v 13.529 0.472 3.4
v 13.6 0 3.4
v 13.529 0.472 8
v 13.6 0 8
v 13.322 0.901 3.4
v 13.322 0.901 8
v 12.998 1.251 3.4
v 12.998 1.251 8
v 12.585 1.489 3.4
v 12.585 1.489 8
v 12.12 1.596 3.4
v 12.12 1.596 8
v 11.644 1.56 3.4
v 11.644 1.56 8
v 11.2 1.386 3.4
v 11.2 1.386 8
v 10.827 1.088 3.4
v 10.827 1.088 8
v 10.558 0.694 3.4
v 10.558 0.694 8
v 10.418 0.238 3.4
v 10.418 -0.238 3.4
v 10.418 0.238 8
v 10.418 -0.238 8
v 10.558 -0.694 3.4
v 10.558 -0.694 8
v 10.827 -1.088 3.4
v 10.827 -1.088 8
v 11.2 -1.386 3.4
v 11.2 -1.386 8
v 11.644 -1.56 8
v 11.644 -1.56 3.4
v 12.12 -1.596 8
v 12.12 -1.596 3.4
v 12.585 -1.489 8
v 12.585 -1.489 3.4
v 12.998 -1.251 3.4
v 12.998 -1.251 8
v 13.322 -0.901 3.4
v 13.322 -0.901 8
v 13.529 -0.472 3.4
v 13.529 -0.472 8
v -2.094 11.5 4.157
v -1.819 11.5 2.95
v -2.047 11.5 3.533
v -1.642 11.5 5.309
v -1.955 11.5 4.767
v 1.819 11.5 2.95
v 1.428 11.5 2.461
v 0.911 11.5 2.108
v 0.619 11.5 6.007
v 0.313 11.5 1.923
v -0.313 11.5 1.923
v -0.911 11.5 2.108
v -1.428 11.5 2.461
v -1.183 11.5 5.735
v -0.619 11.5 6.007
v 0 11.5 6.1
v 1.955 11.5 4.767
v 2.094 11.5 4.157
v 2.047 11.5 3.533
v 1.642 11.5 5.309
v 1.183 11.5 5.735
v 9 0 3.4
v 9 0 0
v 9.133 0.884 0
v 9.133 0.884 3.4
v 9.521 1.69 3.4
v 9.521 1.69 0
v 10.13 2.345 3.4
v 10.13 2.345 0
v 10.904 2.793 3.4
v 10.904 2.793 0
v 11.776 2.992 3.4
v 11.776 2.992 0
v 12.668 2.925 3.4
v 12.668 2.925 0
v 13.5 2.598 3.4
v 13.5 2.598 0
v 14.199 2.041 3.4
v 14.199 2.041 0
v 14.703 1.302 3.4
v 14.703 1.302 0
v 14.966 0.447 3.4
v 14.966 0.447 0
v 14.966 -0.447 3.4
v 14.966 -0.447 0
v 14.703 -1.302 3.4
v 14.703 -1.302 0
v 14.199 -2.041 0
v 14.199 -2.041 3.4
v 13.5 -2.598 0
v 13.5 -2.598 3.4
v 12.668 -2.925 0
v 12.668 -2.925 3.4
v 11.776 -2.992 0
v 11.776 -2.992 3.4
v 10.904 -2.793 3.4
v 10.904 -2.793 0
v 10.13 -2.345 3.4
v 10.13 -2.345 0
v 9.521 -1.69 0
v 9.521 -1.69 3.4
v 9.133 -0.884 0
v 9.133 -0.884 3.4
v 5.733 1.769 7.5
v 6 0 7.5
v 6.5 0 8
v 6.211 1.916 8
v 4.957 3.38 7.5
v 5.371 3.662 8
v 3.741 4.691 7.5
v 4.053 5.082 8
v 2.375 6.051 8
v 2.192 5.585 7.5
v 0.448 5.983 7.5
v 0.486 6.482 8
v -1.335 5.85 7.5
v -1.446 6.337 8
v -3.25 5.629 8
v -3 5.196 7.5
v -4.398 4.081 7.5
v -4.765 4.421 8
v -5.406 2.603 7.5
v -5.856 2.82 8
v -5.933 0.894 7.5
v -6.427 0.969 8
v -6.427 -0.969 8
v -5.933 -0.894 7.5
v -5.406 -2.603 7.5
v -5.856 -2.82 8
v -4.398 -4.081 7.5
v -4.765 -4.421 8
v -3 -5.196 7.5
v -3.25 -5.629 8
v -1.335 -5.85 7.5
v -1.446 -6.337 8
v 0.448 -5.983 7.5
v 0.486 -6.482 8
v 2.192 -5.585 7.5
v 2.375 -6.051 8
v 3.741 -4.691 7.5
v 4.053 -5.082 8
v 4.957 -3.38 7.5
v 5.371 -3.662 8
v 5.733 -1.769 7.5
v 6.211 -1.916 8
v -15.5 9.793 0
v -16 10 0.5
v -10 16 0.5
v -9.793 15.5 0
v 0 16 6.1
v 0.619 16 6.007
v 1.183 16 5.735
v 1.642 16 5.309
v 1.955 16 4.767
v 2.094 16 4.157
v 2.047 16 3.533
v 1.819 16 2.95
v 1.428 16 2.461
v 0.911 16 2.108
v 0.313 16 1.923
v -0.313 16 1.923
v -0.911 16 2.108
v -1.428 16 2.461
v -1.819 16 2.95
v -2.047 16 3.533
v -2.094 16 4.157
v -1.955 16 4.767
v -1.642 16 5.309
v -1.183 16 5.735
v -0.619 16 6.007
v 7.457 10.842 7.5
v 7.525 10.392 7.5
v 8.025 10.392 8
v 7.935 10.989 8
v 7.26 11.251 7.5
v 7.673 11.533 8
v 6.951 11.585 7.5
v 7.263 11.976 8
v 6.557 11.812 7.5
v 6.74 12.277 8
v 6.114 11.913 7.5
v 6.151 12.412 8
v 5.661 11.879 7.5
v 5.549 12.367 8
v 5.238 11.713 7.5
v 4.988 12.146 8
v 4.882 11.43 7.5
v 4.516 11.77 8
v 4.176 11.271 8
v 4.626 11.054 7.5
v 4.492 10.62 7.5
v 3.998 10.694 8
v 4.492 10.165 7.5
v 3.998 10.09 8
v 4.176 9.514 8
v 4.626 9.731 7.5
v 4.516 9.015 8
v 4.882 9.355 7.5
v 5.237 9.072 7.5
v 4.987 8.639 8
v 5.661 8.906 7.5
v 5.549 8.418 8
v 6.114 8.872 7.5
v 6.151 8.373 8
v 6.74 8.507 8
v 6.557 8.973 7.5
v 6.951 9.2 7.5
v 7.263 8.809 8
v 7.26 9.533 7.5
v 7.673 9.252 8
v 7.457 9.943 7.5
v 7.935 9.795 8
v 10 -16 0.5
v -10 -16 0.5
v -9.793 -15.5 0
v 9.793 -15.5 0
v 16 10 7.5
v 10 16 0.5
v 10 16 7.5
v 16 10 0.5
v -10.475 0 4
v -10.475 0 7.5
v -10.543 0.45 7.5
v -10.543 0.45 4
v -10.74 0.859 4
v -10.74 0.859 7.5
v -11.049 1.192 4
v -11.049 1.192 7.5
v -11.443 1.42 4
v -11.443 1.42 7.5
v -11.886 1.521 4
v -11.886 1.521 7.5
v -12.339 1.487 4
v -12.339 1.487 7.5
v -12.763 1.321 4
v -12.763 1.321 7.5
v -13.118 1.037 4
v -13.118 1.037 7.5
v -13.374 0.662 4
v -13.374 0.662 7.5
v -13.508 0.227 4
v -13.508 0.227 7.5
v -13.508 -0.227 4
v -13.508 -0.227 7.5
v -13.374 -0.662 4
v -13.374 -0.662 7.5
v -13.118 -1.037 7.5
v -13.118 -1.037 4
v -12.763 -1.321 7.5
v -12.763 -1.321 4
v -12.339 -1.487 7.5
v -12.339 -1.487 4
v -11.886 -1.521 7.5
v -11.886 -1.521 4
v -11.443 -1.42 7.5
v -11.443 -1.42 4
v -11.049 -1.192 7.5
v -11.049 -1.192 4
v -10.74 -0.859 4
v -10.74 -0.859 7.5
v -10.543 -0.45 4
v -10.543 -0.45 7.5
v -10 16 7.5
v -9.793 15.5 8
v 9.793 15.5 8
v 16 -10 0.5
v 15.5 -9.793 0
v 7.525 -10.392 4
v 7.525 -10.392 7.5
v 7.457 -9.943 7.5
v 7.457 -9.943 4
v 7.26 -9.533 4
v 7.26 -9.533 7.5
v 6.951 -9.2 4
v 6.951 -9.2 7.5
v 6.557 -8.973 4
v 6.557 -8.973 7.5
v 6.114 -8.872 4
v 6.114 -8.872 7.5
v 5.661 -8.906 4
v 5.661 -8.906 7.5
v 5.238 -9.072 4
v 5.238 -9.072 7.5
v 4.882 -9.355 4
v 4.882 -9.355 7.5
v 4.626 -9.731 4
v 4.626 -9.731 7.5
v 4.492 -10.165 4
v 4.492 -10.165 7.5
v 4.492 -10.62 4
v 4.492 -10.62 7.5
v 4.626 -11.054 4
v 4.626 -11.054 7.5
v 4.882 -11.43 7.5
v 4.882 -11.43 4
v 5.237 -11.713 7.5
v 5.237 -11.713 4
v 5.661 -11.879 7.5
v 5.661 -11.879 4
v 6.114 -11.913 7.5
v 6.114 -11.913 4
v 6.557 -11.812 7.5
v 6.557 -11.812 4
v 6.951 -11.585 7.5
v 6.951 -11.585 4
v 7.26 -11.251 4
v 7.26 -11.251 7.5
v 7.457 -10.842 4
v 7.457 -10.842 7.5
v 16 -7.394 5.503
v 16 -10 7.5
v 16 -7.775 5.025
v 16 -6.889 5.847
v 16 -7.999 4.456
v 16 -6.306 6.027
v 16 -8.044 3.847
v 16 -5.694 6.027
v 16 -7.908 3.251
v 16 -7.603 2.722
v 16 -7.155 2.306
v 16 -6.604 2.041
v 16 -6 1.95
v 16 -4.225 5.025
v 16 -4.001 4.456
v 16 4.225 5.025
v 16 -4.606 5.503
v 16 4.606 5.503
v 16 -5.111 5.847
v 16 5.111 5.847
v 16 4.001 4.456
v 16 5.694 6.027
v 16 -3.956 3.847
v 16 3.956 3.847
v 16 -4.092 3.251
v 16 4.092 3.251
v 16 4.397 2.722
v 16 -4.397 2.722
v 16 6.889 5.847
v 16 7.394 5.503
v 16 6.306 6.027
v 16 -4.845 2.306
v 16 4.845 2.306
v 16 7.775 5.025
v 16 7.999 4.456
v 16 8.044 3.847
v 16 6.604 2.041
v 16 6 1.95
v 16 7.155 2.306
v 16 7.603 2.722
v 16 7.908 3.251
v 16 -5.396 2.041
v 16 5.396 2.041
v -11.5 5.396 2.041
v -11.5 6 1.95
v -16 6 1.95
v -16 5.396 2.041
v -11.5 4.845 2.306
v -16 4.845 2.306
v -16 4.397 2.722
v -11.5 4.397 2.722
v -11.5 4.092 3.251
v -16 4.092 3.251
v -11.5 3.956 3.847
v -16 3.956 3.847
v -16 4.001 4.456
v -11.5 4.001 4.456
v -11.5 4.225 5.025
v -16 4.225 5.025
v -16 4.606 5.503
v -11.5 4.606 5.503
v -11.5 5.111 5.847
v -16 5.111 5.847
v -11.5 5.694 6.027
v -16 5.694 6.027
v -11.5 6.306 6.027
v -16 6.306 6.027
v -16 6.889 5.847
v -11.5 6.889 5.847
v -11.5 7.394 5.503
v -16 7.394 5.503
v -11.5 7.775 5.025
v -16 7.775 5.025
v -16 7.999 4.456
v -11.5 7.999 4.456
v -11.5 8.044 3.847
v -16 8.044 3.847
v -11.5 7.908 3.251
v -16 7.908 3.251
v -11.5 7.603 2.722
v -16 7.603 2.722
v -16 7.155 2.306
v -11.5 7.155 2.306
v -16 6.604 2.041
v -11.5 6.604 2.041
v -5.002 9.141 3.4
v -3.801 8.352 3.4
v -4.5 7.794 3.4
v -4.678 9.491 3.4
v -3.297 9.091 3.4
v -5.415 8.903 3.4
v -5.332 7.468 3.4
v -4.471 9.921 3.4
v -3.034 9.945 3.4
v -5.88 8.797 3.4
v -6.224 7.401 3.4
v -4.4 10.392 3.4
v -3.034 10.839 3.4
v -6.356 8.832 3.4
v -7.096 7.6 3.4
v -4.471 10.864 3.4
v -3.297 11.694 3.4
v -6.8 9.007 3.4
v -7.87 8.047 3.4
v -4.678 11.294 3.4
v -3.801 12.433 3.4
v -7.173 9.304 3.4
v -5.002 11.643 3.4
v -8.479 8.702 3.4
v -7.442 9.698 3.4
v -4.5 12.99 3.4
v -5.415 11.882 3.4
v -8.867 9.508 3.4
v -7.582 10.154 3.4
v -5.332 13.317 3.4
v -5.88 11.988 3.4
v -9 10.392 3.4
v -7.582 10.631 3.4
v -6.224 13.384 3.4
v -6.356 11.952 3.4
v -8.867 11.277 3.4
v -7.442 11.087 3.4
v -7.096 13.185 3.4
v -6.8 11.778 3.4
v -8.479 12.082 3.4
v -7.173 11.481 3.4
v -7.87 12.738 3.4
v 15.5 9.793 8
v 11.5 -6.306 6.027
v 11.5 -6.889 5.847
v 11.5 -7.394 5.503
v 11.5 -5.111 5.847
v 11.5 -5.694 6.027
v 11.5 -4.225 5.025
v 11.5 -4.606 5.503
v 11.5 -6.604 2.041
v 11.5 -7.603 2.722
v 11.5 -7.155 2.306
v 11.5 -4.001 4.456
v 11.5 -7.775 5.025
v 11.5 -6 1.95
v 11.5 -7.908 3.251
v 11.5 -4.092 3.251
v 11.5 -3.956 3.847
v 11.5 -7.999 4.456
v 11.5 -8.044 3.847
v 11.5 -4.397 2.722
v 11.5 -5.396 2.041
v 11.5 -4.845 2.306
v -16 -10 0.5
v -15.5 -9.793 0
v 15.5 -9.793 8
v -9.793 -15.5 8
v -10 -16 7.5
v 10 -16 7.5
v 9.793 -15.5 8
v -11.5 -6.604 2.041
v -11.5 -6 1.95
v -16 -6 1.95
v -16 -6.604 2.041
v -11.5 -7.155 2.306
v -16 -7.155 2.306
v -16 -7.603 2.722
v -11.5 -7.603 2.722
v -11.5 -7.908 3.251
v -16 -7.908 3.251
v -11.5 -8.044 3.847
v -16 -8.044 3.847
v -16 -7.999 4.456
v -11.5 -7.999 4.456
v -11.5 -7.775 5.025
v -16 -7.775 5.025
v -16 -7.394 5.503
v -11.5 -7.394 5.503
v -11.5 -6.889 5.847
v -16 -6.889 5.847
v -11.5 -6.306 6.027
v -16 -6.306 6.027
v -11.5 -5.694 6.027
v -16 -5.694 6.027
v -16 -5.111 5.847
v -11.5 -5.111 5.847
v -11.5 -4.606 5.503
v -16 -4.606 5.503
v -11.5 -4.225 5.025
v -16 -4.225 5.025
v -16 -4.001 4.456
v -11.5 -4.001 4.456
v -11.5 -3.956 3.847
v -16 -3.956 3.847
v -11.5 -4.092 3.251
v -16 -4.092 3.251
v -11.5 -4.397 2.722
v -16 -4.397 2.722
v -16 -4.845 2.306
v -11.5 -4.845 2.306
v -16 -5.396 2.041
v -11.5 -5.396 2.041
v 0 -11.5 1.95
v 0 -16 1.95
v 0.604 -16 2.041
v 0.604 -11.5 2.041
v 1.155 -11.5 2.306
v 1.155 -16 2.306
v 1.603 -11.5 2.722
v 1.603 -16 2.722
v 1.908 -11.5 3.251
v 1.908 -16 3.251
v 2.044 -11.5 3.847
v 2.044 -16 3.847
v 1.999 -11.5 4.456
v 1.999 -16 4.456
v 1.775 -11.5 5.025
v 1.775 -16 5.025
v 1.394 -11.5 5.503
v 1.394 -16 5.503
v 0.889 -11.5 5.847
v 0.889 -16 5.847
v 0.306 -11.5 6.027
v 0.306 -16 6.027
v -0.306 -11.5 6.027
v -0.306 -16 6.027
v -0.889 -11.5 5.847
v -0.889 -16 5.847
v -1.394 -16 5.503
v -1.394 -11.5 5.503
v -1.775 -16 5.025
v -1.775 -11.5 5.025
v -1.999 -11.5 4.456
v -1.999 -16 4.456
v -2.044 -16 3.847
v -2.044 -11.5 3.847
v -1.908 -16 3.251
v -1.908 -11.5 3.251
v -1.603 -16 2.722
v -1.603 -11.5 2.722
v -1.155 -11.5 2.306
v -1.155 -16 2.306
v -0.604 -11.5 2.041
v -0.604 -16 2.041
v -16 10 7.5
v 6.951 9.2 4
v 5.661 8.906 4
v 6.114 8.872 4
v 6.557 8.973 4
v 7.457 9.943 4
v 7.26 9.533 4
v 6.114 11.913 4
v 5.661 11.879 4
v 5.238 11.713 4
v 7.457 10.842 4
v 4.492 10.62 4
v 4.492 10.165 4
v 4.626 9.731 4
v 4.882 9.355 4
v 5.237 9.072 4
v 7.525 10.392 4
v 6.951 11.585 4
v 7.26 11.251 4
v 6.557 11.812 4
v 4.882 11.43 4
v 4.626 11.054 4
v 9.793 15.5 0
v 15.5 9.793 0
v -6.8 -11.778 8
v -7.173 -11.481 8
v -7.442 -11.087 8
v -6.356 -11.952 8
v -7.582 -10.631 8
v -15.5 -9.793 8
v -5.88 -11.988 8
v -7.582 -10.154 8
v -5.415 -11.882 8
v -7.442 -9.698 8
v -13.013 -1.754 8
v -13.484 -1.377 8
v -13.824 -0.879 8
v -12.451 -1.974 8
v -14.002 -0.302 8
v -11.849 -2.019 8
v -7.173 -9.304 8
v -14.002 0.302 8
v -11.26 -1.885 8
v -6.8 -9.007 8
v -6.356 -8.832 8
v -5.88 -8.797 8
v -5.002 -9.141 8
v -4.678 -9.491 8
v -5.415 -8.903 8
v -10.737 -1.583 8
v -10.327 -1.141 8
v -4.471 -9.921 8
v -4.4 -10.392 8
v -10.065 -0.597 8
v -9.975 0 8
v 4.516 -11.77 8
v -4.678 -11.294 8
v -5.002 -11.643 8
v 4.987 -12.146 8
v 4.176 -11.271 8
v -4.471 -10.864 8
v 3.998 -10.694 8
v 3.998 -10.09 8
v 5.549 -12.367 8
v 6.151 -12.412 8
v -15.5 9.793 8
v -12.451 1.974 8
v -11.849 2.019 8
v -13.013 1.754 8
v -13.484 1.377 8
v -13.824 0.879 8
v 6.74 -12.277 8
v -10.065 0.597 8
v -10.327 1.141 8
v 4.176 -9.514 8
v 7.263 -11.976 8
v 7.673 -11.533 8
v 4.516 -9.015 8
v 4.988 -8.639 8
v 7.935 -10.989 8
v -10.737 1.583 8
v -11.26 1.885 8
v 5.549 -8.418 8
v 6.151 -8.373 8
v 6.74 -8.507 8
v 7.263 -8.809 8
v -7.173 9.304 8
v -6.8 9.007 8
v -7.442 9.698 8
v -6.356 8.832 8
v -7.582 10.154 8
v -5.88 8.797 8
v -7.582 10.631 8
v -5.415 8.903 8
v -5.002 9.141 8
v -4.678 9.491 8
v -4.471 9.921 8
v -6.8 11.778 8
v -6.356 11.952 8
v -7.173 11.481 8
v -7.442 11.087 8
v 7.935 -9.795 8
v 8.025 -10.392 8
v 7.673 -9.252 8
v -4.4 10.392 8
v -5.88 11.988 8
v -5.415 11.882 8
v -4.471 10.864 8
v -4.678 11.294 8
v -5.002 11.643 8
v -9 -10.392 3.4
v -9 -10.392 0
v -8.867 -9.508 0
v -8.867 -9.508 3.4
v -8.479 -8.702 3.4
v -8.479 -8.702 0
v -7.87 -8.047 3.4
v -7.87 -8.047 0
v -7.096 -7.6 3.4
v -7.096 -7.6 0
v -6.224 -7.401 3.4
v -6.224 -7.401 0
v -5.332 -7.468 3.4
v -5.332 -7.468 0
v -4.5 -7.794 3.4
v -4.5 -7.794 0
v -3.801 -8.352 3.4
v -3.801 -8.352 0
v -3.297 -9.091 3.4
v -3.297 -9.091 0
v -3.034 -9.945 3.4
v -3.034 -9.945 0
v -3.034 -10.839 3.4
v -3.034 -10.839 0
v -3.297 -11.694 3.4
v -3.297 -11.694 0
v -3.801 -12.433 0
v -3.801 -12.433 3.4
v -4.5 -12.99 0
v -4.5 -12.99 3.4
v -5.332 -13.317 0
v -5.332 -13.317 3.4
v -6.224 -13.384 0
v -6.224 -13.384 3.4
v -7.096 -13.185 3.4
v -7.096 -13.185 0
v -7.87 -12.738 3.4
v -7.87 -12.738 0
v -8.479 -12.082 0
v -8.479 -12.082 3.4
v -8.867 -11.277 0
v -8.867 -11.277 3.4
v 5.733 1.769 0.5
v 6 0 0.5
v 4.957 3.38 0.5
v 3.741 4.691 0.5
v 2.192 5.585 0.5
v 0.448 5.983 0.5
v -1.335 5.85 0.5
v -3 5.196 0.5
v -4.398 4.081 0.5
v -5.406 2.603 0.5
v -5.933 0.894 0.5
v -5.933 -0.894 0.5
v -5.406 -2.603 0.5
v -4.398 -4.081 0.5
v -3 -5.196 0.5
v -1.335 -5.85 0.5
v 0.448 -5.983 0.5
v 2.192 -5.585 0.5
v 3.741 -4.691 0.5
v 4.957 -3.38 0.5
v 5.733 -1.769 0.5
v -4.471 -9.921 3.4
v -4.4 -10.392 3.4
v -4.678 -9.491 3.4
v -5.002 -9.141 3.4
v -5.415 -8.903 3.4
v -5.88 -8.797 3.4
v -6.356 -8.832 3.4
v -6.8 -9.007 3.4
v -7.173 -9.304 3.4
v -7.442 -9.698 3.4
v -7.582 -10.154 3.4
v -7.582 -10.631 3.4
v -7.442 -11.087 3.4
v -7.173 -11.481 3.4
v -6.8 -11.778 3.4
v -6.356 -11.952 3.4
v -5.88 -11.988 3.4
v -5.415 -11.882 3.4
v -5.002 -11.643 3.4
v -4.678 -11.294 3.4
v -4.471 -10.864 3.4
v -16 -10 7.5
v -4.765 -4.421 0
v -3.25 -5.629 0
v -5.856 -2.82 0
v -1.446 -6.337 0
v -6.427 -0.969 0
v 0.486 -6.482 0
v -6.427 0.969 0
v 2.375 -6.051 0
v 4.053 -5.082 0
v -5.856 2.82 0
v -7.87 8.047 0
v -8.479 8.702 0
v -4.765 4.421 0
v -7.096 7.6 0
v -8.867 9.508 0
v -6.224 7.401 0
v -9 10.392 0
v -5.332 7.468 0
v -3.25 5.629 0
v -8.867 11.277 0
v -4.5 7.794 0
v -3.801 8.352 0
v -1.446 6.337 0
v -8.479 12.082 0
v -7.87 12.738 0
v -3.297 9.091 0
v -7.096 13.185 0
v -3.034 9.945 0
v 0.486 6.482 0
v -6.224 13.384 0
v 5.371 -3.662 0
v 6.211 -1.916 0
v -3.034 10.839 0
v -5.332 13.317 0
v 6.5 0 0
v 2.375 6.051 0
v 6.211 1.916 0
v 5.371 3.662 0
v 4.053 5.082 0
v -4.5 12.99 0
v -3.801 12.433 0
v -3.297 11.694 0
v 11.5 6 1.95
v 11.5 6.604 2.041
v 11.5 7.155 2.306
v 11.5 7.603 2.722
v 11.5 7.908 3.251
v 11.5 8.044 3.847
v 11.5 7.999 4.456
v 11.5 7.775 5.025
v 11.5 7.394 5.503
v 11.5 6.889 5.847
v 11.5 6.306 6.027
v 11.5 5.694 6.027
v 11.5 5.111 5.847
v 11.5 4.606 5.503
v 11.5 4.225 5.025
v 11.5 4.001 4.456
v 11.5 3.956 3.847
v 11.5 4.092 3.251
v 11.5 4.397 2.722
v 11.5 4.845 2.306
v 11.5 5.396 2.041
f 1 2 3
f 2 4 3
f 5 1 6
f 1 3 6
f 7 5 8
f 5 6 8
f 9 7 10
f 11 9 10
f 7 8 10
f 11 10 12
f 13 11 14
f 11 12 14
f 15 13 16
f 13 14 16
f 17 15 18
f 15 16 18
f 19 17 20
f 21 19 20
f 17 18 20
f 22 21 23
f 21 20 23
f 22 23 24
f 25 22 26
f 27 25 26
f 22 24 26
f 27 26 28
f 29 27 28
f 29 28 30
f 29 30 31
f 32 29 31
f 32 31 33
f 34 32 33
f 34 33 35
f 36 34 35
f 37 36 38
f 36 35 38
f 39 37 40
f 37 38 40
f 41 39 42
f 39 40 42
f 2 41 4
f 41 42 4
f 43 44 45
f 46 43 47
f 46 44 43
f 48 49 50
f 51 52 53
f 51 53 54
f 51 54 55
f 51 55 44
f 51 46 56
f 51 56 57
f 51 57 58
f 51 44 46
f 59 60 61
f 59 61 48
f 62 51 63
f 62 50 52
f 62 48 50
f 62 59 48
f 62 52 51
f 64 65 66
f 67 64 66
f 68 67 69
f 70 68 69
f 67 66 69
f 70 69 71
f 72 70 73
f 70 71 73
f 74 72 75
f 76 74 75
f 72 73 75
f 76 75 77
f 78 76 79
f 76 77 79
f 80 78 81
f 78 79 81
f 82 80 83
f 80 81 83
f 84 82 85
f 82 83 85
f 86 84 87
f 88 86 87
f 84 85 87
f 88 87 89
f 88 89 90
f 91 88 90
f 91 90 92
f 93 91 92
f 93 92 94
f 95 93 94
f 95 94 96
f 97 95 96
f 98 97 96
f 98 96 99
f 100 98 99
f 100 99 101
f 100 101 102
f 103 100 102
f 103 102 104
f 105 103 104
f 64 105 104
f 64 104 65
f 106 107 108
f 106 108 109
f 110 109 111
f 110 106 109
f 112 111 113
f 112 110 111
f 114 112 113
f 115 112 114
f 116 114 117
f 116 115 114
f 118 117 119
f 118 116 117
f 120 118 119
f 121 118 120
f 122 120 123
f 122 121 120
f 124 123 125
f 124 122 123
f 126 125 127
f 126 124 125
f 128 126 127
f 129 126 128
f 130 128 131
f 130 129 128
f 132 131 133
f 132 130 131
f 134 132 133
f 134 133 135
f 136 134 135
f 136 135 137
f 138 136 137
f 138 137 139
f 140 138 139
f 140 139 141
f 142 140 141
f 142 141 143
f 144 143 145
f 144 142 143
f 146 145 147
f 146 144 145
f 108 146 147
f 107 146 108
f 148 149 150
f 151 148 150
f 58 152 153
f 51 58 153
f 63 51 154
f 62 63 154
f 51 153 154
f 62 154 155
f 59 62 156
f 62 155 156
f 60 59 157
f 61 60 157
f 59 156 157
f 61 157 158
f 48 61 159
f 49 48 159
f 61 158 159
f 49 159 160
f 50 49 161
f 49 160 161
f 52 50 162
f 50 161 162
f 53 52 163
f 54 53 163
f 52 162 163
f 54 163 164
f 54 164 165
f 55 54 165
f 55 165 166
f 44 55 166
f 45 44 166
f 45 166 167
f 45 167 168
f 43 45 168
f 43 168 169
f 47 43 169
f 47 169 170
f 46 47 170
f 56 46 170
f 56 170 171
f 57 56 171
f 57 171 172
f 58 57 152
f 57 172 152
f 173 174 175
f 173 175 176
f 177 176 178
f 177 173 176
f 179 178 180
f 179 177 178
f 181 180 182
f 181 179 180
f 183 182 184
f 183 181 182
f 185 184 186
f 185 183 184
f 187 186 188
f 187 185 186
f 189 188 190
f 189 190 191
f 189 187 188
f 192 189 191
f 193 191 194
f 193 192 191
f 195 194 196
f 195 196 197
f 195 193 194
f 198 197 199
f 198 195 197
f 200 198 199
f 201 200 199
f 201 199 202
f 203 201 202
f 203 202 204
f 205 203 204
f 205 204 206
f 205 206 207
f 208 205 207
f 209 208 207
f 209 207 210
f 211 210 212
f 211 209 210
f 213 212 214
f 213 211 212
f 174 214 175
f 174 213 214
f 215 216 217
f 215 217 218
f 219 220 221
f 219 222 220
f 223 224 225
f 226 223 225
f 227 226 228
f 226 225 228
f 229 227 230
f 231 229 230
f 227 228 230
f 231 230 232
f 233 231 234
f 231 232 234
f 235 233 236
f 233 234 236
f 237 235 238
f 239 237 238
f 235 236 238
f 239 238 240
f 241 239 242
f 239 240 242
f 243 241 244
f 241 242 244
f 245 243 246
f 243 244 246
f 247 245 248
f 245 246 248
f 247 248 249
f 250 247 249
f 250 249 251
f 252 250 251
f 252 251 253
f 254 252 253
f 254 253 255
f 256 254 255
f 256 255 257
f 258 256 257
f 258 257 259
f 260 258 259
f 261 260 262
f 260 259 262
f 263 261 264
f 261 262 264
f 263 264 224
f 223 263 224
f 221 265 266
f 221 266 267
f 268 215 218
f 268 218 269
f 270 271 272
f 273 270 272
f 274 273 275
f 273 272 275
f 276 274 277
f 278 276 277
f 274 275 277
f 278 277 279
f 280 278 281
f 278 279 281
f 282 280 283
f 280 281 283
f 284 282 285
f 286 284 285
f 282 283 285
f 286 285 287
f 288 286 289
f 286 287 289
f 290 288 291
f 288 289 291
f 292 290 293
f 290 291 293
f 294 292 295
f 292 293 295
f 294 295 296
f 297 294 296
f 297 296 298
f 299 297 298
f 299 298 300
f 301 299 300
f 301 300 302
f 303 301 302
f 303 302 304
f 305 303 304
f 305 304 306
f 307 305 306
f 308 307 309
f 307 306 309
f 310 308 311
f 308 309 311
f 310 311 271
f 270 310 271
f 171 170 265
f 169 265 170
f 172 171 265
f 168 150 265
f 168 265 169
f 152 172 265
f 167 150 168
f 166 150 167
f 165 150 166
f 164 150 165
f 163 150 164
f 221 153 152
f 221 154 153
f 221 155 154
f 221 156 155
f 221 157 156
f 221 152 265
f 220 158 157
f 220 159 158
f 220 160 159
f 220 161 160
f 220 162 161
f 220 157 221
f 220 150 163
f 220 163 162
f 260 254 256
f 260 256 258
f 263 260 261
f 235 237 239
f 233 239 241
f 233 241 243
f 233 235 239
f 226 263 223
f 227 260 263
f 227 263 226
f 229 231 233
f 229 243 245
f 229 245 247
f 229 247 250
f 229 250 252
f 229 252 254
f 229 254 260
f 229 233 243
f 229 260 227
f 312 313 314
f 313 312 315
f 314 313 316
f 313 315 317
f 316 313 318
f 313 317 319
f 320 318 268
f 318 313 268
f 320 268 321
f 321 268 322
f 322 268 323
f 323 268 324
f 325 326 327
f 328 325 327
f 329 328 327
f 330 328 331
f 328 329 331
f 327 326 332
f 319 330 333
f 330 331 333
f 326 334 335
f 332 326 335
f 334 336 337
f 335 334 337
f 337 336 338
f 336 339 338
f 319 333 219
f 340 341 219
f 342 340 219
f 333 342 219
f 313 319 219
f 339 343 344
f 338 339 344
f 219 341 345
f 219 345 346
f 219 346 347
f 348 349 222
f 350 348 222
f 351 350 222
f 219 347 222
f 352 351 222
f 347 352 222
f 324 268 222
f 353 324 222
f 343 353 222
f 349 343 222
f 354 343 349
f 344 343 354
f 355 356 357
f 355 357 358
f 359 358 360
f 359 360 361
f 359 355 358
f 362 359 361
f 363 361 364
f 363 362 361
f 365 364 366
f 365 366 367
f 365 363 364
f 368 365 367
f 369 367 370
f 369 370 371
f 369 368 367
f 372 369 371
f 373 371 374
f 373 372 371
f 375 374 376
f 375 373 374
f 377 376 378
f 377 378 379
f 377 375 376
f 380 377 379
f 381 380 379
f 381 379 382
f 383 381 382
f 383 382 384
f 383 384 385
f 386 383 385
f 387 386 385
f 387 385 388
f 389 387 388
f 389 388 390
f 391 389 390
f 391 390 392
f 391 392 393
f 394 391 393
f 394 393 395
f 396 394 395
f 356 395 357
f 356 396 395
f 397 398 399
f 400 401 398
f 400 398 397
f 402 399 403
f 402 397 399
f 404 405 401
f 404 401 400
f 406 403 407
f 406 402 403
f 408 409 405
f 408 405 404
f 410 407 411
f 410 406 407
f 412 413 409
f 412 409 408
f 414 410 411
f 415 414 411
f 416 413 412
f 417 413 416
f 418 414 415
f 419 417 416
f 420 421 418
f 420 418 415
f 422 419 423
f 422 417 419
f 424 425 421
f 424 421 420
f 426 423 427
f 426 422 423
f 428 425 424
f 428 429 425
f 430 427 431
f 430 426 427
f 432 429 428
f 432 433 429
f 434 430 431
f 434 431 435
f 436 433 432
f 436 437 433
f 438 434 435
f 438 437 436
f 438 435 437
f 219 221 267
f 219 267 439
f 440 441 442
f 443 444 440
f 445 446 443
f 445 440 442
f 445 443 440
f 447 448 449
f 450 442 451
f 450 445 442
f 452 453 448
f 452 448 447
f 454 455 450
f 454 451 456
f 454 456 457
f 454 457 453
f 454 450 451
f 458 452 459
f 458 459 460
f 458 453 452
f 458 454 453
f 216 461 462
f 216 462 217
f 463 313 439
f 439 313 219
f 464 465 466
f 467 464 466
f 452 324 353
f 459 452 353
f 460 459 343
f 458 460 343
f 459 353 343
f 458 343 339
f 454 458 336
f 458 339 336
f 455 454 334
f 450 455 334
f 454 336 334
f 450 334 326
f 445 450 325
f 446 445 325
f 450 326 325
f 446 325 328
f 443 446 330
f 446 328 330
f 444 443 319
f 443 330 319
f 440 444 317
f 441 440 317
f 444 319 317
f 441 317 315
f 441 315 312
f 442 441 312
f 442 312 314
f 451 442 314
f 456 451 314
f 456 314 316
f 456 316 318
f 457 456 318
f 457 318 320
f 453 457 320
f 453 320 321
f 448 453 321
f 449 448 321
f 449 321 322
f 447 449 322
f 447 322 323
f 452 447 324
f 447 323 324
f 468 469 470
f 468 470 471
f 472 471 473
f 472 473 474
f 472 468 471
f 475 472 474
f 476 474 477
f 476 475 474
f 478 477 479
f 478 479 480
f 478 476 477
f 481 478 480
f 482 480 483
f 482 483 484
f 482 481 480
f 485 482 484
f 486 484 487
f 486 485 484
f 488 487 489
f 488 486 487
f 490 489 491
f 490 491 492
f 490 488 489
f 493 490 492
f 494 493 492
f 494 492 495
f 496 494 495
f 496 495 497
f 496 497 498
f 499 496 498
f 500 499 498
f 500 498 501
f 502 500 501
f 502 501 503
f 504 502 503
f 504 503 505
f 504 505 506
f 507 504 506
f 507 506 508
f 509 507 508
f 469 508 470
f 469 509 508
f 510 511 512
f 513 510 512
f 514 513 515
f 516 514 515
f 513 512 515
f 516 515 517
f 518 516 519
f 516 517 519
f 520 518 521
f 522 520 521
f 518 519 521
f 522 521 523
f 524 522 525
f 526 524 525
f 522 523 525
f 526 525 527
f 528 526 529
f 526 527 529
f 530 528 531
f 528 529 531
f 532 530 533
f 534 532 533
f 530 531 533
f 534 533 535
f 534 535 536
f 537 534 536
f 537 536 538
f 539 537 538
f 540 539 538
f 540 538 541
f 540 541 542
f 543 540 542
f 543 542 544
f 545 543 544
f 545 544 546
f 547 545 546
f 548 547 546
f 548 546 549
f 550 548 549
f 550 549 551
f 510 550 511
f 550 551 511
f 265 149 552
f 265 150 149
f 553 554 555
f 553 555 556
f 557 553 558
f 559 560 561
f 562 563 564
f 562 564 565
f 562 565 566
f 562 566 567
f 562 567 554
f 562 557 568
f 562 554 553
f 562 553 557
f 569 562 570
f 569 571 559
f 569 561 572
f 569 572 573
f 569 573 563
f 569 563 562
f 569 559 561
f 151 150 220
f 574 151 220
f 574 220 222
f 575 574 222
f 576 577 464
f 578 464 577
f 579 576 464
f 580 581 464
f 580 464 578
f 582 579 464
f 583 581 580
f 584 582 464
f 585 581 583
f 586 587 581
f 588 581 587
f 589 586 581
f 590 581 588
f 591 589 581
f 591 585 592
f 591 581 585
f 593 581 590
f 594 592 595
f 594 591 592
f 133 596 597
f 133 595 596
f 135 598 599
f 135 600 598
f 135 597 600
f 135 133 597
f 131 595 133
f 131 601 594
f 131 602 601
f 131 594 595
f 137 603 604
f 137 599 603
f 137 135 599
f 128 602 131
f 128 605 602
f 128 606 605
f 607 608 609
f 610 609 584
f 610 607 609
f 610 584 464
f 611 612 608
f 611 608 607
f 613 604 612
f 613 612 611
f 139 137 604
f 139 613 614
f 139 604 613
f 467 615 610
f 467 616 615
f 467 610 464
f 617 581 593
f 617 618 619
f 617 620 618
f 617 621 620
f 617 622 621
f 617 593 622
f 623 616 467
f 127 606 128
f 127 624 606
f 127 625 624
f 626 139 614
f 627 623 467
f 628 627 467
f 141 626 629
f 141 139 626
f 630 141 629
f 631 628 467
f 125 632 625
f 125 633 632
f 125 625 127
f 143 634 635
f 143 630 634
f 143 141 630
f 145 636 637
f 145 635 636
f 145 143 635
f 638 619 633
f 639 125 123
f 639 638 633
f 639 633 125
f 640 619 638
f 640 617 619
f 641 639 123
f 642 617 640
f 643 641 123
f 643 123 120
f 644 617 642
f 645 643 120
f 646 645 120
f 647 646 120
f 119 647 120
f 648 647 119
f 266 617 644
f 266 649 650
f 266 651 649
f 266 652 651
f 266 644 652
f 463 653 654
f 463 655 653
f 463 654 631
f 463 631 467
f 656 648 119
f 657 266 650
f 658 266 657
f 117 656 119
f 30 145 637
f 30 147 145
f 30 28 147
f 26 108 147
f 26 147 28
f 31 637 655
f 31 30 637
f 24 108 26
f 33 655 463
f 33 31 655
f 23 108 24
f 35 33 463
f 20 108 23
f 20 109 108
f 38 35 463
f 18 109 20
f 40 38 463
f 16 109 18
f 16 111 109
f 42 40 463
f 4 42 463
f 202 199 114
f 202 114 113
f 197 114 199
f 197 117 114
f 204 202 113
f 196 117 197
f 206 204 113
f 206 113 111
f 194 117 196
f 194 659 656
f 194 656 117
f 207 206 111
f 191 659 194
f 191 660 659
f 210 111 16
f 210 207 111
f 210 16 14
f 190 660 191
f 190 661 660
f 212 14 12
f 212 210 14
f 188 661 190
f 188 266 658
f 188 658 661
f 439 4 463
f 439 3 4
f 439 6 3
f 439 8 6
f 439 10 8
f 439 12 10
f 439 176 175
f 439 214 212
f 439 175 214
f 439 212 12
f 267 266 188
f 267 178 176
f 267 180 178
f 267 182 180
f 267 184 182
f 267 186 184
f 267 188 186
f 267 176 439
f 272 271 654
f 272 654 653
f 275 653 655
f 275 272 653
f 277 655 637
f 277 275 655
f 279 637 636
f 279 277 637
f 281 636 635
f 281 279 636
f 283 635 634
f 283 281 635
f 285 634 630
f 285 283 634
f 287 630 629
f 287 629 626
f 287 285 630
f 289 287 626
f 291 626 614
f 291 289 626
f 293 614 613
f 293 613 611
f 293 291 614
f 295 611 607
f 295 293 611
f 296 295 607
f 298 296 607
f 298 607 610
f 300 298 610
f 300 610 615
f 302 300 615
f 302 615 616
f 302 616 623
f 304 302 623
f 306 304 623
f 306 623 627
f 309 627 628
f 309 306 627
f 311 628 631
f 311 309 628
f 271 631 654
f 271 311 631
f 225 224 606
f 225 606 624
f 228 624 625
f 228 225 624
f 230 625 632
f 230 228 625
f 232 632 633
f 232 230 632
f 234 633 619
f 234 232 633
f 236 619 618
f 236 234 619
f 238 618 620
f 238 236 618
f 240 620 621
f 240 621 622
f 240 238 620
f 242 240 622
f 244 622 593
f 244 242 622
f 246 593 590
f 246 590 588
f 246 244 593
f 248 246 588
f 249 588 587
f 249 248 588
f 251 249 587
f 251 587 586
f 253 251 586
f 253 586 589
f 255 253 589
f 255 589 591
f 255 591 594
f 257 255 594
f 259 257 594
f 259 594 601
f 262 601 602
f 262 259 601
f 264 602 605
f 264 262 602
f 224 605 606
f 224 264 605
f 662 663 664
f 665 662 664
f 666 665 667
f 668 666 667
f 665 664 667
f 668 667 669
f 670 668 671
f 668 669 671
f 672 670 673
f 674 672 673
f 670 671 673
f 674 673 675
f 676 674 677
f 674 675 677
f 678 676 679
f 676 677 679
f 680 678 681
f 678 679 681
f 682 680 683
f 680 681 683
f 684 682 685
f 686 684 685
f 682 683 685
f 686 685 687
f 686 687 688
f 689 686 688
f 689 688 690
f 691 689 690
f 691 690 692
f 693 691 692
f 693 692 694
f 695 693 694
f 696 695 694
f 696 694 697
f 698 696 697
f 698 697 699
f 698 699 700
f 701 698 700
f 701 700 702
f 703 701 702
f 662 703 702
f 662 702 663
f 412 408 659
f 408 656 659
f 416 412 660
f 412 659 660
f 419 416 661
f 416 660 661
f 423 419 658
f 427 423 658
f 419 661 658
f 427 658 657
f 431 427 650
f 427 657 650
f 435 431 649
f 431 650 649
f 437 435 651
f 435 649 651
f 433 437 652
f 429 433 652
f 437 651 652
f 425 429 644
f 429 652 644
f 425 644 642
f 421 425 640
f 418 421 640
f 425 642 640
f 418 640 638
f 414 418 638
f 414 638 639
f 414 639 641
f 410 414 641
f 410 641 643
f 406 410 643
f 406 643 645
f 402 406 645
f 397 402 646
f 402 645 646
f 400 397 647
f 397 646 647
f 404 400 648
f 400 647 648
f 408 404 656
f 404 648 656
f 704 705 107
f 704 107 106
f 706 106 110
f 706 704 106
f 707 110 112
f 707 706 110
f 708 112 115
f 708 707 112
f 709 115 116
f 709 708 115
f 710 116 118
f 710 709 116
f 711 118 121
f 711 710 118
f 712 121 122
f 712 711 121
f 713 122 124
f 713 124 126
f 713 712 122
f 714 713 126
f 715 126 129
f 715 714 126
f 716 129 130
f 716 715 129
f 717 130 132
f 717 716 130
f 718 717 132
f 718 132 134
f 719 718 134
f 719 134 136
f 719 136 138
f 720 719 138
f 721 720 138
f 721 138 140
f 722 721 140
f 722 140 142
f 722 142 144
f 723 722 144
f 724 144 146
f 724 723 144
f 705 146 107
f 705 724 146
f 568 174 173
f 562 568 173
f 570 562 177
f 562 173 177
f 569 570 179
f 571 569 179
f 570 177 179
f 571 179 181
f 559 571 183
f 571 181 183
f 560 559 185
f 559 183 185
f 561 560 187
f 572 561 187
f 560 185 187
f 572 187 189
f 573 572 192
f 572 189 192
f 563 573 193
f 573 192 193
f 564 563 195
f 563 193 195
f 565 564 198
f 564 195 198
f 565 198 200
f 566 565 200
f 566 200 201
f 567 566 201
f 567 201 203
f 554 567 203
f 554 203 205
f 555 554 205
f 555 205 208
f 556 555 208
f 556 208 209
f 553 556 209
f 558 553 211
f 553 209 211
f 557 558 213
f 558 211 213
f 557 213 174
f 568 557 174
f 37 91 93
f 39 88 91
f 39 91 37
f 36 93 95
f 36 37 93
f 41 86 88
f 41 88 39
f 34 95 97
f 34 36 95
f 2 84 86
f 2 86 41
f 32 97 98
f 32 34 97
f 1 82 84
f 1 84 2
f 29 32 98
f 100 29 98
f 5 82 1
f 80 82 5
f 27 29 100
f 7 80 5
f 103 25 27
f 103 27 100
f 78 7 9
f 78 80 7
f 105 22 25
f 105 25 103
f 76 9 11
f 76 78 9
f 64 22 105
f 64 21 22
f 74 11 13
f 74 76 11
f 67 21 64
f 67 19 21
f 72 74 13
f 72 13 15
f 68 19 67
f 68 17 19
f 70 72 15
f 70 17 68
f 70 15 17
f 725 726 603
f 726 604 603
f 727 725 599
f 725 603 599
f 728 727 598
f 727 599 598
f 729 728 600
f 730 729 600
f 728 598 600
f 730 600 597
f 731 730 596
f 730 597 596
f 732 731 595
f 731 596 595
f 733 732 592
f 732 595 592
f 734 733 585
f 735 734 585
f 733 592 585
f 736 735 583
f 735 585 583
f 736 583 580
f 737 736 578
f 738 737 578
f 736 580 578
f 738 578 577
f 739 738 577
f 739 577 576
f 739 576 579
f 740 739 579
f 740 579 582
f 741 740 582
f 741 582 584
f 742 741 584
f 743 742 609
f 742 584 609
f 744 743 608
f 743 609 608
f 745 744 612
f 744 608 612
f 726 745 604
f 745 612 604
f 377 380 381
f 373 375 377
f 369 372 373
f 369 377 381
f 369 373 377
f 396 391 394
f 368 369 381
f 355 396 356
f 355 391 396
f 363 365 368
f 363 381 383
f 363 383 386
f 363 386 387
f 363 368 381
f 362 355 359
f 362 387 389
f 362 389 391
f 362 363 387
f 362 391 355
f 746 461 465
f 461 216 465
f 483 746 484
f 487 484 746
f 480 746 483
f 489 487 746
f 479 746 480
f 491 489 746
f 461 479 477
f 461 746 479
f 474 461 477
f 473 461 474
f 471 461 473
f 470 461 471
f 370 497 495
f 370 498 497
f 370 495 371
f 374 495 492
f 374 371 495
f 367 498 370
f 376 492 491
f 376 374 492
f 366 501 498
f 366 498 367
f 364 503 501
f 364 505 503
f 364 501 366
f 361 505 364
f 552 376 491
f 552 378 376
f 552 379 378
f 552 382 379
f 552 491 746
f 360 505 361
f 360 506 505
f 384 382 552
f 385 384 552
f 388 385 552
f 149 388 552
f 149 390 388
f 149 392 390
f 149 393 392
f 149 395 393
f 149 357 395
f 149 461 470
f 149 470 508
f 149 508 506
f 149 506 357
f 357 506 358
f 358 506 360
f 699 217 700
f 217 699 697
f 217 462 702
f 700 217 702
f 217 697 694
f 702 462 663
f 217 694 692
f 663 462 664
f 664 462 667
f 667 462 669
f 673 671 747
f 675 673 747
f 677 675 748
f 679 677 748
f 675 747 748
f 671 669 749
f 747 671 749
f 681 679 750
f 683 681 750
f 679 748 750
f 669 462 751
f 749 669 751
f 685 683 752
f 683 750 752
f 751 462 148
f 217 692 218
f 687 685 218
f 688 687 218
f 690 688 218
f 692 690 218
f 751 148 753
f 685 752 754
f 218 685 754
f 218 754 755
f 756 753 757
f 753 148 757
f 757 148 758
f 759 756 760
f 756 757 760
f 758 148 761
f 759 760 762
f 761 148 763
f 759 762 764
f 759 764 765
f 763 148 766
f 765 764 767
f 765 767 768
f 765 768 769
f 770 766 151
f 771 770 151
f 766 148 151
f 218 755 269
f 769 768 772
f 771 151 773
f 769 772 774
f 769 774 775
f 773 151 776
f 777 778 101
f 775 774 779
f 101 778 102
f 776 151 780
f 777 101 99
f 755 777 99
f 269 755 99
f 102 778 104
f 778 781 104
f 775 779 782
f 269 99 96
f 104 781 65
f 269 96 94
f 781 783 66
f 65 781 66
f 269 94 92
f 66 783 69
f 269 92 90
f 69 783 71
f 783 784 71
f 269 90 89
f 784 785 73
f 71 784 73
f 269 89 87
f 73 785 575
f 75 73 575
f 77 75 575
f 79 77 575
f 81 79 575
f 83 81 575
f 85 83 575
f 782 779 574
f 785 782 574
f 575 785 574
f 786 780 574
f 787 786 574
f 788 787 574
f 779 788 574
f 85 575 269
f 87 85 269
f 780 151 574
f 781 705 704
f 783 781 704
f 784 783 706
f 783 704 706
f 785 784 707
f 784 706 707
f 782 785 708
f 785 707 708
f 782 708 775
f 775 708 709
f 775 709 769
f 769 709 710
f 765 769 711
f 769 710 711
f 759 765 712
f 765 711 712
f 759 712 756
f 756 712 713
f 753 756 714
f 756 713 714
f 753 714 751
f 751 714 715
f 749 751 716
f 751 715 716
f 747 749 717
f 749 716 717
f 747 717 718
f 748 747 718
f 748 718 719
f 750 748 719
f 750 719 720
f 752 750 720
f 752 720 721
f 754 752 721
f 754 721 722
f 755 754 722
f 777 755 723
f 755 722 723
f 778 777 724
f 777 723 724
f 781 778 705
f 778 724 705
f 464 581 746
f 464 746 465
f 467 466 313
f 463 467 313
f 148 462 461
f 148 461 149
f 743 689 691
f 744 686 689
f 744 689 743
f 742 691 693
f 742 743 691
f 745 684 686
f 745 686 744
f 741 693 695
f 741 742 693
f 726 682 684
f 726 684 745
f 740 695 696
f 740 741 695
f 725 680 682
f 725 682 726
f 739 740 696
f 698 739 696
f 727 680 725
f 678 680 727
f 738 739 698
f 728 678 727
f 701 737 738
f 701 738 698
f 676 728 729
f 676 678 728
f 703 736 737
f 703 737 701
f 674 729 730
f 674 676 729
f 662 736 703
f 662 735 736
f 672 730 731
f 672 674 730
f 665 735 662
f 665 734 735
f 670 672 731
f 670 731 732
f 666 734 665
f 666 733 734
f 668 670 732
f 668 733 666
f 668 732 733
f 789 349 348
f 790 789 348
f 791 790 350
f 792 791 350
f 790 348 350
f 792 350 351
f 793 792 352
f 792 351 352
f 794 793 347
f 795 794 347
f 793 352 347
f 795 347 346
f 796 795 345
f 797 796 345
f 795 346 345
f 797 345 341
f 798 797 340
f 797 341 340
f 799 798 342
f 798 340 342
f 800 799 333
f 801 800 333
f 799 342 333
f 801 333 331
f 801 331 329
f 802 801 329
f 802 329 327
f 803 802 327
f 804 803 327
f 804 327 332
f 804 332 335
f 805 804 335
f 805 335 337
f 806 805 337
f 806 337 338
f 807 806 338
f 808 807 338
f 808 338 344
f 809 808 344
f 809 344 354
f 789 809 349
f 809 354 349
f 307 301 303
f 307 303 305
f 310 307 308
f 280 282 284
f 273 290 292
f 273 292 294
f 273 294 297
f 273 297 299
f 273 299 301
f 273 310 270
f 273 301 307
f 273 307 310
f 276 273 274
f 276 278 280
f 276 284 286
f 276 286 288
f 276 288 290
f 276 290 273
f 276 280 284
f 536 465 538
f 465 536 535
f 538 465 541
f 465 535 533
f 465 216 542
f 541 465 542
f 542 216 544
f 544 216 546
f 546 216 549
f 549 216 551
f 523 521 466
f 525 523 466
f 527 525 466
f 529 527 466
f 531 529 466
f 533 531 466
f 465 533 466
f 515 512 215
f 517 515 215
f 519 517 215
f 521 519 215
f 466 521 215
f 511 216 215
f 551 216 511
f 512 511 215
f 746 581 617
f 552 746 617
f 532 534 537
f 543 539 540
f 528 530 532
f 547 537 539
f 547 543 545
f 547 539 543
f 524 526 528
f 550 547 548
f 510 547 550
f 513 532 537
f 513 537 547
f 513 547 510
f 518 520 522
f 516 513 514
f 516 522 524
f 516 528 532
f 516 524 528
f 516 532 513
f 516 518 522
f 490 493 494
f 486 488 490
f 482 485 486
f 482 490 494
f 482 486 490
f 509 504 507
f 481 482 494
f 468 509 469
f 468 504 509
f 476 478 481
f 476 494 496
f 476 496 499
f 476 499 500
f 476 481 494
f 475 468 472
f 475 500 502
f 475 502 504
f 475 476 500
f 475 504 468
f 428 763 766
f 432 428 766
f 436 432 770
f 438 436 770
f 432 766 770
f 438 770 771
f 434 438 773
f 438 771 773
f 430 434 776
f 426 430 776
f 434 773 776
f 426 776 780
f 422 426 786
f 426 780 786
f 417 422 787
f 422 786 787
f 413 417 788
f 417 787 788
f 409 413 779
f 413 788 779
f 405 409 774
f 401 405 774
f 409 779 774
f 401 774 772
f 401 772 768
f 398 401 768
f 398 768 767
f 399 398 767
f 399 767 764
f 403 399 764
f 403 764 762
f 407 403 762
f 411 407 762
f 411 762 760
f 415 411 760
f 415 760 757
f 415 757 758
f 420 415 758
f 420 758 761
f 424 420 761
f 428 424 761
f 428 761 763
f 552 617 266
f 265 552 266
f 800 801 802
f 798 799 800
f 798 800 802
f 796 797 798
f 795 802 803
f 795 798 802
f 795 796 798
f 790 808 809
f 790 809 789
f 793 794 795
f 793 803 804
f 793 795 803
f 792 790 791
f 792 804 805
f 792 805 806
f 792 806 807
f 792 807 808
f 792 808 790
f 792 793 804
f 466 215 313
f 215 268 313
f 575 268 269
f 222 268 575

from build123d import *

# Parameters (mm, degrees)
SKETCH_1_W                   = 32
SKETCH_1_H                   = 32
SKETCH_1_R                   = 6
EXTRUDE_1_DEPTH              = 8
SKETCH_2_R                   = 1.525
CUT_EXTRUDE_1_DEPTH          = 4
CHAMFER_1_SIZE               = 6
SKETCH_4_R                   = 2.1
CUT_EXTRUDE_2_DEPTH          = 4.5
SKETCH_5_R                   = 2.05
CUT_EXTRUDE_3_DEPTH          = 4.5
SKETCH_6_R                   = 2.05
CUT_EXTRUDE_4_DEPTH          = 4.5
CUT_EXTRUDE_START            = -4.5
SKETCH_7_R                   = 2.05
CUT_EXTRUDE_5_DEPTH          = 4.5
CHAMFER_2_SIZE               = 0.5
HOLE_WIZARD_M3_1_D           = 3.2
HOLE_WIZARD_M3_1_CBORE_D     = 6
HOLE_WIZARD_M3_1_CBORE_DEPTH = 3.4


with BuildPart() as part:
    # 草图1 → 凸台-拉伸1 (new body)
    with BuildSketch(Plane.XY):
        Rectangle(SKETCH_1_W, SKETCH_1_H)
        Circle(SKETCH_1_R, mode=Mode.SUBTRACT)
    extrude(amount=EXTRUDE_1_DEPTH)

    # 草图2 → 切除-拉伸1 (cut)
    with BuildSketch(Plane.XY.offset(8)):
        with Locations((-12, 0)):
            Circle(SKETCH_2_R)
        with Locations((6, 10.392304845)):
            Circle(SKETCH_2_R)
        with Locations((6, -10.392304845)):
            Circle(SKETCH_2_R)
    extrude(amount=-CUT_EXTRUDE_1_DEPTH, mode=Mode.SUBTRACT)

    # 倒角1
    chamfer_1_edges = [part.edges().sort_by_distance(p)[0] for p in [
        (16, -16, 4),
        (-16, -16, 4),
        (-16, 16, 4),
        (16, 16, 4),
    ]]
    chamfer(chamfer_1_edges, length=CHAMFER_1_SIZE)

    # 草图4 → 切除-拉伸2 (cut)
    with BuildSketch(Plane(origin=(0, 16, 0), x_dir=(1, 0, 0), z_dir=(0, 1, 0))):
        with Locations(Location((0, -4, 0), (0, 0, 270))):
            Circle(SKETCH_4_R)
    extrude(amount=-CUT_EXTRUDE_2_DEPTH, mode=Mode.SUBTRACT)

    # 草图5 → 切除-拉伸3 (cut)
    with BuildSketch(Plane.XZ.offset(16)):
        with Locations(Location((0, 4, 0), (0, 0, 270))):
            Circle(SKETCH_5_R)
    extrude(amount=-CUT_EXTRUDE_3_DEPTH, mode=Mode.SUBTRACT)

    # 草图6 → 切除-拉伸4 (cut)
    with BuildSketch(Plane(origin=(16, 0, 0), x_dir=(0, 0, -1), z_dir=(1, 0, 0))):
        with Locations((-4, 6)):
            Circle(SKETCH_6_R)
        with Locations((-4, -6)):
            Circle(SKETCH_6_R)
    extrude(amount=-CUT_EXTRUDE_4_DEPTH, mode=Mode.SUBTRACT)

    # 草图7 → 切除-拉伸5 (cut)
    with BuildSketch(Plane.ZY.offset(16).offset(CUT_EXTRUDE_START)):
        with Locations(Location((4, 6, 0), (0, 0, 180))):
            Circle(SKETCH_7_R)
        with Locations(Location((4, -6, 0), (0, 0, 180))):
            Circle(SKETCH_7_R)
    extrude(amount=CUT_EXTRUDE_5_DEPTH, mode=Mode.SUBTRACT)

    # 倒角2
    chamfer_2_edges = [part.edges().sort_by_distance(p)[0] for p in [
        (-6, 0, 0),
        (-6, 0, 8),
        (-13.525, 0, 8),
        (4.475, 10.392304845, 8),
        (4.475, -10.392304845, 8),
        (0, -16, 0),
        (0, -16, 8),
        (16, 0, 0),
        (-16, 0, 0),
        (0, 16, 0),
        (13, 13, 0),
        (-13, 13, 0),
        (13, -13, 0),
        (-13, -13, 0),
        (-16, 0, 8),
        (16, 0, 8),
        (0, 16, 8),
        (13, 13, 8),
        (-13, 13, 8),
        (13, -13, 8),
        (-13, -13, 8),
    ]]
    chamfer(chamfer_2_edges, length=CHAMFER_2_SIZE)

    # M3 六角圆柱头螺钉的柱形沉头孔1 (through all)
    with Locations(Plane(origin=(0, 0, 0), x_dir=(-1, 0, 0), z_dir=(0, 0, -1))):
        with Locations((-12, 0), (6, 10.392304845), (6, -10.392304845)):
            CounterBoreHole(HOLE_WIZARD_M3_1_D / 2, HOLE_WIZARD_M3_1_CBORE_D / 2, HOLE_WIZARD_M3_1_CBORE_DEPTH)


solid = part.part
